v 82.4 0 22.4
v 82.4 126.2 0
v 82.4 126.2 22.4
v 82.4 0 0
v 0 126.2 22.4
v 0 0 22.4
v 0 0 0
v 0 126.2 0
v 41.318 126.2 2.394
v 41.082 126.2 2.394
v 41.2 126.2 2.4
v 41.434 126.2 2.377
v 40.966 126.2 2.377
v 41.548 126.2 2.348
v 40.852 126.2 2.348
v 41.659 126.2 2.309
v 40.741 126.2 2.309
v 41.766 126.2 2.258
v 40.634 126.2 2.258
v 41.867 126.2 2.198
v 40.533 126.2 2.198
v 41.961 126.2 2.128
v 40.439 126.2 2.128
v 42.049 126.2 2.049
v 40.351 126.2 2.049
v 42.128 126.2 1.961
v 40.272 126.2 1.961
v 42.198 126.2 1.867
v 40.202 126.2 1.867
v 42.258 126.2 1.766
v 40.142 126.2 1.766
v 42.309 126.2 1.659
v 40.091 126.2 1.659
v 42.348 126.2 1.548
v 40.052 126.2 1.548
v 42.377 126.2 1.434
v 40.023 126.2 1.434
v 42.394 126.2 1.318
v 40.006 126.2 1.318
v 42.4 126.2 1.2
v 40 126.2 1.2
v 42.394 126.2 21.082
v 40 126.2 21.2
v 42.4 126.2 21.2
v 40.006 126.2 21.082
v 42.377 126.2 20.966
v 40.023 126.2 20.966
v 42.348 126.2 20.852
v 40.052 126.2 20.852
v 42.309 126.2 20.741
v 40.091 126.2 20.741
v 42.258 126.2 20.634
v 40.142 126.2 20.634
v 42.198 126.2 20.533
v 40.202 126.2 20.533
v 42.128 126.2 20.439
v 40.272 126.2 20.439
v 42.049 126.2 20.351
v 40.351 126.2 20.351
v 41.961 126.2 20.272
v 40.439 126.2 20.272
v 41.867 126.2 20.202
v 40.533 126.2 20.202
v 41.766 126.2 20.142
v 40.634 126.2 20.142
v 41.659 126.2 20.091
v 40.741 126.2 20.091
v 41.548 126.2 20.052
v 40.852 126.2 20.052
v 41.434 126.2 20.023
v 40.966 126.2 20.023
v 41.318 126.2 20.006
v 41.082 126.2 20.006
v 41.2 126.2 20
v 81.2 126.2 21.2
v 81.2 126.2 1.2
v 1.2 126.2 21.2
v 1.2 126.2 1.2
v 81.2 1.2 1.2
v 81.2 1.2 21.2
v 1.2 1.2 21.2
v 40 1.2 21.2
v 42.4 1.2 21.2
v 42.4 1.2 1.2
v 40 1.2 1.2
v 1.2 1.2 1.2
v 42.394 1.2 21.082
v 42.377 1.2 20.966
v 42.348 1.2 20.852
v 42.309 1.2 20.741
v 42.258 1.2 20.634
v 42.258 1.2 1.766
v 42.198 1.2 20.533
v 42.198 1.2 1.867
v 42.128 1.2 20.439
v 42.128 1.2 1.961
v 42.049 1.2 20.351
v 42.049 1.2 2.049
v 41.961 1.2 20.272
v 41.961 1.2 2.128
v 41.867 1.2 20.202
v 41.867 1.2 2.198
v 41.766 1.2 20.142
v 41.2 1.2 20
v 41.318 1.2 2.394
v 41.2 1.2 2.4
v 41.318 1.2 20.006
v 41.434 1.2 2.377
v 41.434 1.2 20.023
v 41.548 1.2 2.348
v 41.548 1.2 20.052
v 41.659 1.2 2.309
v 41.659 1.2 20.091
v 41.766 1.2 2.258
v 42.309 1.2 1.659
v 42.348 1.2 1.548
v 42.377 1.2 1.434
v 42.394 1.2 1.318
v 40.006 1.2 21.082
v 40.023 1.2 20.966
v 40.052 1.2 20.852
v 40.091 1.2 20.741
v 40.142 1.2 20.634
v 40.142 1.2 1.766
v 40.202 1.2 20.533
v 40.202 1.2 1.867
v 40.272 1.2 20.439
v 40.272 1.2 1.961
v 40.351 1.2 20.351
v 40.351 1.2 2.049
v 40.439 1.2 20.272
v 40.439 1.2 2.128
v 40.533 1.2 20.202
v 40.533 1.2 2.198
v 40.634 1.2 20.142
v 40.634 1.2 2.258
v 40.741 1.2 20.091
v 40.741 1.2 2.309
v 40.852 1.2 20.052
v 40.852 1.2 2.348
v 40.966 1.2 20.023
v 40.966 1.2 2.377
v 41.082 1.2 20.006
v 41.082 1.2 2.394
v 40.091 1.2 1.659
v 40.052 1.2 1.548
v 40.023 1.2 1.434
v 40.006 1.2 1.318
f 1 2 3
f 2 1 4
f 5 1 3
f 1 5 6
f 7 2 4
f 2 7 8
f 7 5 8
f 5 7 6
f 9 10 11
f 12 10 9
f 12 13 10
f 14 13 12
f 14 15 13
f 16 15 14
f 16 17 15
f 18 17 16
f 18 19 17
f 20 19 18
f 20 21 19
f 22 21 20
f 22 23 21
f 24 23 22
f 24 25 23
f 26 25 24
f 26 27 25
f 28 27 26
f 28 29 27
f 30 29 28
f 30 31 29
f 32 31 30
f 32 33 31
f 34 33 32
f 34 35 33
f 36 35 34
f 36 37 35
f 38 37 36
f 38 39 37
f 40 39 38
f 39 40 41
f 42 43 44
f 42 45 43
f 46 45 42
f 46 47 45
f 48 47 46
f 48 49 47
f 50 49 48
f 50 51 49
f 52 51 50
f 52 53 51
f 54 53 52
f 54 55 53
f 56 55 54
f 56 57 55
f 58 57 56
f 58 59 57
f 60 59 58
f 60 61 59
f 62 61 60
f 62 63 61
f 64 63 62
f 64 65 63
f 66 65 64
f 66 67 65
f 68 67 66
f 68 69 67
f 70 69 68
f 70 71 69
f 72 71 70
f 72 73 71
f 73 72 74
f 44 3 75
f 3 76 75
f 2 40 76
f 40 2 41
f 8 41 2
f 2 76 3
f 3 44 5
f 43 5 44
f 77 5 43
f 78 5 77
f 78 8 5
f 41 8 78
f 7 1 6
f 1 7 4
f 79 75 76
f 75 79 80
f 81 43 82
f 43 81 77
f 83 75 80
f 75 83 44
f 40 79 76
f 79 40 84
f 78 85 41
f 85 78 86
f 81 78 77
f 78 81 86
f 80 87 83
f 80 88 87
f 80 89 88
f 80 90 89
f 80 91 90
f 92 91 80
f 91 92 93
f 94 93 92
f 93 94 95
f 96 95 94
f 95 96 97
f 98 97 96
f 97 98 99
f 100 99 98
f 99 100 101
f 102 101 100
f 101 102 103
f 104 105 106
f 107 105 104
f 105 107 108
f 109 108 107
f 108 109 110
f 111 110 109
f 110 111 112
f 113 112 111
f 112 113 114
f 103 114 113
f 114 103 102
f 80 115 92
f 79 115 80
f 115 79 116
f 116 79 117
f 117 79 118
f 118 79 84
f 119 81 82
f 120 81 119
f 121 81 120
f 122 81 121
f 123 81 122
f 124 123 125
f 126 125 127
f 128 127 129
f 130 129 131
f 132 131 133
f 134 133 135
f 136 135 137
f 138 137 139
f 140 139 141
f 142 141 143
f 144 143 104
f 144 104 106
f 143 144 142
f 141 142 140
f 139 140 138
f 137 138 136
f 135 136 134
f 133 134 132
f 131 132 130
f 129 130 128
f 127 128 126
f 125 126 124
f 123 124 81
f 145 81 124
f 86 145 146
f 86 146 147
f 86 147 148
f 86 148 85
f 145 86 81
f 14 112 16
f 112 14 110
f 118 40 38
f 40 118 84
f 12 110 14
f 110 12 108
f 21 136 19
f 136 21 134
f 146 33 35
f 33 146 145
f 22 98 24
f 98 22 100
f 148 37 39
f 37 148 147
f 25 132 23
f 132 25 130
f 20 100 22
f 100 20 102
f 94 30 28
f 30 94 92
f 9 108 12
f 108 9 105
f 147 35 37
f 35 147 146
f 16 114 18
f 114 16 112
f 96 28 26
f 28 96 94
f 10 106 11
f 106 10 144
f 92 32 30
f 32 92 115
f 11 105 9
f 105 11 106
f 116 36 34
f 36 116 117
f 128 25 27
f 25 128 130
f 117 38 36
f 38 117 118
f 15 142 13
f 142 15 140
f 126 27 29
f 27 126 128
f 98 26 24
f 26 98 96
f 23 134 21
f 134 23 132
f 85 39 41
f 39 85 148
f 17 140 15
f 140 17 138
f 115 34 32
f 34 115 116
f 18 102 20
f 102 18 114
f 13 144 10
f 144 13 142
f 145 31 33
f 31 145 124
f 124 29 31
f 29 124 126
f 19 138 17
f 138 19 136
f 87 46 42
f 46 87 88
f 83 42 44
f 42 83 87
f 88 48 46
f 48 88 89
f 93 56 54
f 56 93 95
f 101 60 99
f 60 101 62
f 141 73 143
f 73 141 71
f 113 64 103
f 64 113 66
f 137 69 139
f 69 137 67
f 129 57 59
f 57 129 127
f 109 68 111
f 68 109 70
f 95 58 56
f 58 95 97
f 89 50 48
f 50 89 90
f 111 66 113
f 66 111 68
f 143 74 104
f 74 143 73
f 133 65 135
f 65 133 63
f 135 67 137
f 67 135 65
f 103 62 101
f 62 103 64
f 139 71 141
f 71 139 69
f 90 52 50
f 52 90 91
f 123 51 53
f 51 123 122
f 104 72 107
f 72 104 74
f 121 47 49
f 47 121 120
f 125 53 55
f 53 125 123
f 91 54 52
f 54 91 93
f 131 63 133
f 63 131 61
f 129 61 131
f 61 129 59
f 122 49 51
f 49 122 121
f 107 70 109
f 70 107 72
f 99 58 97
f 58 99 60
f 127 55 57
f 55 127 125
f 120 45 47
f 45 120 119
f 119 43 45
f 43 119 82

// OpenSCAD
t=1.2;
$fn=64;

difference() {
  cube([80+t*2,125+t,20+t*2]);
  translate([t,t,t]) cube([80,125.1,20]);
}
translate([80/2+t,t,t]) rotate([-90,0,0]) cylinder(r=t,h=125);
translate([80/2+t,t,t+20]) rotate([-90,0,0]) cylinder(r=t,h=125);
